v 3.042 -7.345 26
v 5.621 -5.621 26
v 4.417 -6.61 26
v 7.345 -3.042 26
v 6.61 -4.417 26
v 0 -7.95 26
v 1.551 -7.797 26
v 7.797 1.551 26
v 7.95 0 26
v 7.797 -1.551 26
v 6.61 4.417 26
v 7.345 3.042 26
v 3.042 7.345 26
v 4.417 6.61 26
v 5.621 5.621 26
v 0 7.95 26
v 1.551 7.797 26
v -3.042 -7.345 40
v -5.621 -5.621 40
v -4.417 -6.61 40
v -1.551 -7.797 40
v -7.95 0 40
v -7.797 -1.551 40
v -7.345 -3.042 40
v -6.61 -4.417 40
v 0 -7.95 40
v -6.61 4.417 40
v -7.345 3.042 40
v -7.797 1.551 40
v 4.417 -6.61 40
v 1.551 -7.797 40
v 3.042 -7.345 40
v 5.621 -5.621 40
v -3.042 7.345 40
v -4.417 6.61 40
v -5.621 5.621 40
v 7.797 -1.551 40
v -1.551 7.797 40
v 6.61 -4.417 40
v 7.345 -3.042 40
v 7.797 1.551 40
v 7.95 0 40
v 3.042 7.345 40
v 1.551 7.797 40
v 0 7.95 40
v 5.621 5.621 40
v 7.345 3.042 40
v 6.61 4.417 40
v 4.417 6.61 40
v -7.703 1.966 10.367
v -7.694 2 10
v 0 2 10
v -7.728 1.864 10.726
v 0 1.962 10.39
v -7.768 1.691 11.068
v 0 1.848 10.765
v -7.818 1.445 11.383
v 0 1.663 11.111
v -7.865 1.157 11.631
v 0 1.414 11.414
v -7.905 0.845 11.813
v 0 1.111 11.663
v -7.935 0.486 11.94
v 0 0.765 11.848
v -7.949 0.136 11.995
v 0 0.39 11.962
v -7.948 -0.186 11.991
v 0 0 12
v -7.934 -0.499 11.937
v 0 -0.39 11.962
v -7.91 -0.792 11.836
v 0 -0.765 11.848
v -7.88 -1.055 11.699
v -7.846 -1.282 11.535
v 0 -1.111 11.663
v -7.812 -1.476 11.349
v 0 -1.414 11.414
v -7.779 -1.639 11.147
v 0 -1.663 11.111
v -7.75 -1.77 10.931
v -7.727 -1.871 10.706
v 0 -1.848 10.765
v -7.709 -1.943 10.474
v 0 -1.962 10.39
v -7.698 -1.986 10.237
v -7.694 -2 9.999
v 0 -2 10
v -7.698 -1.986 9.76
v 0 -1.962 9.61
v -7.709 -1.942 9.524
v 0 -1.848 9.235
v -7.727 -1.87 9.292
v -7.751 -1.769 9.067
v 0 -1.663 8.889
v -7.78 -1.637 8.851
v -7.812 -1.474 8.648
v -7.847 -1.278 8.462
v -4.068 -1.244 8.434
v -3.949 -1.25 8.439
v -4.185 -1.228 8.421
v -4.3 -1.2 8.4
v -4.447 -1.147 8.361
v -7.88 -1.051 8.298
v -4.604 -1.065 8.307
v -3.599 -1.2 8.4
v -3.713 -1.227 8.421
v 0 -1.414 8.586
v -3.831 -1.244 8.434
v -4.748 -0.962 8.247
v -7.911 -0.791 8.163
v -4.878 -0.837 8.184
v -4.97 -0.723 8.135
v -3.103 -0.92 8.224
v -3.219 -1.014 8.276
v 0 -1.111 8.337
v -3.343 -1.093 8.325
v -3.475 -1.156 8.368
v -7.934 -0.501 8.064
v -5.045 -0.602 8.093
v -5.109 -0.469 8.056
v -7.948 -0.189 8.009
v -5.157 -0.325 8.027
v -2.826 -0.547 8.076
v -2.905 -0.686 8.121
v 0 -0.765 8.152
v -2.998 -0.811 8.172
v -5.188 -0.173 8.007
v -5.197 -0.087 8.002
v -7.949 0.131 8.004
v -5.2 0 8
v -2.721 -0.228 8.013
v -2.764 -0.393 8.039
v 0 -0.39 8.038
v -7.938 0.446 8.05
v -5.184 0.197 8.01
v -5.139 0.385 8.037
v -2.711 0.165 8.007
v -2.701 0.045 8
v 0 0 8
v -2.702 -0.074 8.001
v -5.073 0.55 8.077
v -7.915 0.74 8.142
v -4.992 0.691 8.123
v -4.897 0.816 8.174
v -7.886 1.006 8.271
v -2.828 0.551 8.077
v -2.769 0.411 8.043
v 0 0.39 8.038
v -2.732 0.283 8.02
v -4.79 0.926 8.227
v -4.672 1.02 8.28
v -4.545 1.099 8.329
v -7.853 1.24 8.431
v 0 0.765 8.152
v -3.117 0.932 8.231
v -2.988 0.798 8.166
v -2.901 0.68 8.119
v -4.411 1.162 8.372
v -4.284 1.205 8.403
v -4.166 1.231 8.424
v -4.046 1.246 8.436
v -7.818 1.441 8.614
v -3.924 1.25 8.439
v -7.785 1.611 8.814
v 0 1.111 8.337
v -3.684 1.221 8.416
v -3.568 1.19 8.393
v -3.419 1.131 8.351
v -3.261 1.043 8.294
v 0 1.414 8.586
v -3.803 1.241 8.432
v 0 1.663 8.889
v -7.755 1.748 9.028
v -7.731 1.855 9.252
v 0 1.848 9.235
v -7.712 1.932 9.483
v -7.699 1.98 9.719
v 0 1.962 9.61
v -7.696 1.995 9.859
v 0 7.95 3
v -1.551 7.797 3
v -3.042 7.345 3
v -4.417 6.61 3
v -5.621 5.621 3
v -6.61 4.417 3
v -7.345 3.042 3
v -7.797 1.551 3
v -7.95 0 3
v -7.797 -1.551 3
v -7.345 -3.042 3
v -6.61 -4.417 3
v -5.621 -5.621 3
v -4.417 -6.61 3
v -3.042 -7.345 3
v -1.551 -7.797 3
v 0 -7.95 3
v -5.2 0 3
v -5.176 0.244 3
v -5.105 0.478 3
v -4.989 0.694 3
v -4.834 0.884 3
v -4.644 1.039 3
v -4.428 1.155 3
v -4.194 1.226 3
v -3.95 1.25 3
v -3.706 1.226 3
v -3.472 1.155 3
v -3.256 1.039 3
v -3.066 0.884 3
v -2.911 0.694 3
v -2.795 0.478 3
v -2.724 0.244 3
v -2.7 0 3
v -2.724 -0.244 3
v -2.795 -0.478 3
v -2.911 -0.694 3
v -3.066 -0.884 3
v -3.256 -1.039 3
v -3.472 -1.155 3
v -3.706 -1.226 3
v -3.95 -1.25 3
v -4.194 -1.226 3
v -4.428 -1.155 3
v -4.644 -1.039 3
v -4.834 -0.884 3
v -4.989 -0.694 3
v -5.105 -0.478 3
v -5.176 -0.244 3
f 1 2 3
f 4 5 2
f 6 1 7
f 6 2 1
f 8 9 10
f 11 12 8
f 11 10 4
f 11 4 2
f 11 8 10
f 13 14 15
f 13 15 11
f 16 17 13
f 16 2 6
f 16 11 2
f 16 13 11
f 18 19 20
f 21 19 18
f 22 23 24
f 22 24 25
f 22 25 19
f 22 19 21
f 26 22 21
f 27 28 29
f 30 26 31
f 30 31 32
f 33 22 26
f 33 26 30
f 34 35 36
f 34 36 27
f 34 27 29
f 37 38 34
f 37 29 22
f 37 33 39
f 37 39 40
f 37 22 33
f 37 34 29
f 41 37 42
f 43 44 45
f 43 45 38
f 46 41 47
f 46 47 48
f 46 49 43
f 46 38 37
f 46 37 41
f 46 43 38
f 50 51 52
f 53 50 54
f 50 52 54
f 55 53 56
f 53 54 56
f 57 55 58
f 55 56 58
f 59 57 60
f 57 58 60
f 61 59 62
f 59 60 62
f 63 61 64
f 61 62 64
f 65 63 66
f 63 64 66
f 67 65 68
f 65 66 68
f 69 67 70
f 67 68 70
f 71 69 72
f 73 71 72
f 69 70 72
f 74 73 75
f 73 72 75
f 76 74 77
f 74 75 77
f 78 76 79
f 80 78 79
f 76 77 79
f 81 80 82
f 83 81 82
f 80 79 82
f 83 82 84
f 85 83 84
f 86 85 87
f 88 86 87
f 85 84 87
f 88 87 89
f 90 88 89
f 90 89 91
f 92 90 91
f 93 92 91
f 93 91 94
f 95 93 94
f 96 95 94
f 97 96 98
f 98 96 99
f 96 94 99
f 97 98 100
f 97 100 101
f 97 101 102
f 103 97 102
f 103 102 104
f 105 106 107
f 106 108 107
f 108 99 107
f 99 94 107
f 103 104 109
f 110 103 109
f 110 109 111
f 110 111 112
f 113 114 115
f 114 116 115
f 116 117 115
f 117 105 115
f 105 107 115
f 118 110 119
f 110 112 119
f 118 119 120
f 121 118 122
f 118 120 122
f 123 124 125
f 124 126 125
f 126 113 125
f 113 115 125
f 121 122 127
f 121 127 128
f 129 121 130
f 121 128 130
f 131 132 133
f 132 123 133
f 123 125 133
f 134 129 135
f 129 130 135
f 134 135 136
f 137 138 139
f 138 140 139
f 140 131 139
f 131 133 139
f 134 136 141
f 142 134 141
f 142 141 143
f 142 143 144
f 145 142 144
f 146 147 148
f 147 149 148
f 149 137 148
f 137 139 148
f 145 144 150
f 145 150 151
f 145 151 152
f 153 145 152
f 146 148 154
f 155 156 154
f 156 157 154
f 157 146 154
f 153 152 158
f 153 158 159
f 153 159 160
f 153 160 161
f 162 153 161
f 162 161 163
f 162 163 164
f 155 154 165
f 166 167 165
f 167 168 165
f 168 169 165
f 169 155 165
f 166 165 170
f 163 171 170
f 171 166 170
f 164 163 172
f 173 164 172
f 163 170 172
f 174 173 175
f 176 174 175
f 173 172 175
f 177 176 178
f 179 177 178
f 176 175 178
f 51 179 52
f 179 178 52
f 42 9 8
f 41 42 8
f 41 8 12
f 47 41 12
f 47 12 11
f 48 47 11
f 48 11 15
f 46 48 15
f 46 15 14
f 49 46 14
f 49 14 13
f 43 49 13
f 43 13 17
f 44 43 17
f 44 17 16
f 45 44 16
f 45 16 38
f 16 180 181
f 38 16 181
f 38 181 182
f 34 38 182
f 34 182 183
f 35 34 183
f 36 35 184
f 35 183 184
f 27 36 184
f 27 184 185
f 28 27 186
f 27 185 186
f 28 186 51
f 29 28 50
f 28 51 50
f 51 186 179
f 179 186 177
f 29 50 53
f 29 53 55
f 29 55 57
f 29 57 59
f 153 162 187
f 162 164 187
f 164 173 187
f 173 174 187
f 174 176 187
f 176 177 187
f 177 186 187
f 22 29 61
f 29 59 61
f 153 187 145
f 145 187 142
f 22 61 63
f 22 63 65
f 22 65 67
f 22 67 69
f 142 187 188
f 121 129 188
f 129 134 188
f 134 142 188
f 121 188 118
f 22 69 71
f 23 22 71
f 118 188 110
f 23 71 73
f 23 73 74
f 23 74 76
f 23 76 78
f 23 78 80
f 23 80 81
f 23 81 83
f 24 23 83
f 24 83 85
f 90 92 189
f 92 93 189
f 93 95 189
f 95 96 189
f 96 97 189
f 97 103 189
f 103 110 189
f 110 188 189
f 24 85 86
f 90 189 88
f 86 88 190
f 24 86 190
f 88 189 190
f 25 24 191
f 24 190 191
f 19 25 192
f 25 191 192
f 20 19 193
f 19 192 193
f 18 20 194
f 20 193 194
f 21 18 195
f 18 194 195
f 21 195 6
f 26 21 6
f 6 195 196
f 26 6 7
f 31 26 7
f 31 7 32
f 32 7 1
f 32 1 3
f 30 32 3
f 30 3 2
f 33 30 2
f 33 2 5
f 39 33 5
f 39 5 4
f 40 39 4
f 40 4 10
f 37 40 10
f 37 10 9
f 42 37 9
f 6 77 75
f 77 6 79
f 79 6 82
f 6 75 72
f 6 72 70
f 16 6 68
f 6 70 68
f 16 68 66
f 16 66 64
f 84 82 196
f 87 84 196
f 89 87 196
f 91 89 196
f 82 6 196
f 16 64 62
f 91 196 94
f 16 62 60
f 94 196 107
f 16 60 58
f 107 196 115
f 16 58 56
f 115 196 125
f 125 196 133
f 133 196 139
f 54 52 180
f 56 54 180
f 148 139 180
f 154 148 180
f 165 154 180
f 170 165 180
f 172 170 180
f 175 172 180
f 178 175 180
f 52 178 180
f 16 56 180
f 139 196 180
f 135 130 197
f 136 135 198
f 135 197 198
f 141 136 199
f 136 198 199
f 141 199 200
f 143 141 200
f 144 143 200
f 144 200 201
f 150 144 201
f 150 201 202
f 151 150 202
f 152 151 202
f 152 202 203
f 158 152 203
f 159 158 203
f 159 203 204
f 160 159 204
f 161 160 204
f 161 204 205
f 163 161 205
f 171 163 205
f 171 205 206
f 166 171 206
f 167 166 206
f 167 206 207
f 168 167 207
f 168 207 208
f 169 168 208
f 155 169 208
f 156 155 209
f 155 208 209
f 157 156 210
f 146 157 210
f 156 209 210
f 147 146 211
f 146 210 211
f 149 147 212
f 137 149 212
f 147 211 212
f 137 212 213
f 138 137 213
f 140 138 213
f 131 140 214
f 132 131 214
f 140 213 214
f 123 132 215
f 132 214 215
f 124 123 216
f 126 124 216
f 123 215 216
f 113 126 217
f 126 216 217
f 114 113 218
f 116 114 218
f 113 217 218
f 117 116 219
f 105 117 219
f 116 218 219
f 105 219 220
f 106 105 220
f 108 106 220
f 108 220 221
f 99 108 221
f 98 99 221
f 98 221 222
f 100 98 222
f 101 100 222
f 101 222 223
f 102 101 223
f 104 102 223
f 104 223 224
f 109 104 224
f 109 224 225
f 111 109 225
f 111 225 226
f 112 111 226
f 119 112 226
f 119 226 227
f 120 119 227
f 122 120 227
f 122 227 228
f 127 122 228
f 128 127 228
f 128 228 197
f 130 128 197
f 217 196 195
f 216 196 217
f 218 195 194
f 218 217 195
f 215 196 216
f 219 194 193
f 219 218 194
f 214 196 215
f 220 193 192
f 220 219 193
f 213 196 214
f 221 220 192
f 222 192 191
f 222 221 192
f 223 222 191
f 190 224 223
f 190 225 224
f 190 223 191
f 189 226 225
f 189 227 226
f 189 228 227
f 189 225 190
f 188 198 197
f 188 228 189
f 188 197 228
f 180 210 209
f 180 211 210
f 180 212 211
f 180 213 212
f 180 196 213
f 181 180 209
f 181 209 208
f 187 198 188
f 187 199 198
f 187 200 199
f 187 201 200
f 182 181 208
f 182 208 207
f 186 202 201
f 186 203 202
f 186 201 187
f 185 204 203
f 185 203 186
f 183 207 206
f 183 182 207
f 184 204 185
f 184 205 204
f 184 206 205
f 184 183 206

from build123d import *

# Parameters (mm, degrees)
SKETCH_1_R          = 7.95
EXTRUDE_1_DEPTH     = 30
SKETCH_2_R          = 7.95
EXTRUDE_2_DEPTH     = 10
SKETCH_3_W          = 7.95
SKETCH_3_H          = 15.9
CUT_EXTRUDE_1_DEPTH = 26
SKETCH_4_R          = 2
CUT_EXTRUDE_2_DEPTH = 42.550030084
M3X0_5_1_REACH      = 43.55
M3X0_5_1_BORE_R     = 1.25
CUT_EXTRUDE_3_DEPTH = 39.670466911


with BuildPart() as part:
    # ｽｹｯﾁ1 → ﾎﾞｽ - 押し出し1 (new body)
    with BuildSketch(Plane.XY):
        Circle(SKETCH_1_R)
    extrude(amount=EXTRUDE_1_DEPTH)

    # ｽｹｯﾁ2 → ﾎﾞｽ - 押し出し2 (add)
    with BuildSketch(Plane.XY.offset(30)):
        Circle(SKETCH_2_R)
    extrude(amount=EXTRUDE_2_DEPTH)

    # ｽｹｯﾁ3 → ｶｯﾄ - 押し出し1 (cut)
    with BuildSketch(Plane(origin=(0, 0, 0), x_dir=(-1, 0, 0), z_dir=(0, 0, -1))):
        with Locations((-3.975, 0)):
            Rectangle(SKETCH_3_W, SKETCH_3_H)
    extrude(amount=-CUT_EXTRUDE_1_DEPTH, mode=Mode.SUBTRACT)

    # ｽｹｯﾁ4 → ｶｯﾄ - 押し出し2 (cut, through all)
    with BuildSketch(Plane(origin=(0, 0, 0), x_dir=(0, 0, -1), z_dir=(1, 0, 0))):
        with Locations(Location((-10, 0, 0), (0, 0, 90))):
            Circle(SKETCH_4_R)
    extrude(amount=-CUT_EXTRUDE_2_DEPTH, mode=Mode.SUBTRACT)

    # M3x0.5 ねじ穴1 bore → M3x0.5 ねじ穴1 (cut, up to next)
    with BuildSketch(Plane(origin=(0, 0, 0), x_dir=(-1, 0, 0), z_dir=(0, 0, -1)), mode=Mode.PRIVATE) as m3x0_5_1_sk1:
        with Locations((3.95, 0)):
            Circle(M3X0_5_1_BORE_R)
    m3x0_5_1_tool1 = extrude(m3x0_5_1_sk1.sketch, amount=-M3X0_5_1_REACH, mode=Mode.PRIVATE) & part.part
    add(m3x0_5_1_tool1.solids().sort_by_distance((-3.95, 0, 0))[0], mode=Mode.SUBTRACT)

    # ｽｹｯﾁ7 → ｶｯﾄ - 押し出し3 (cut, through all)
    with BuildSketch(Plane(origin=(0, 0, 3), x_dir=(-1, 0, 0), z_dir=(0, 0, -1))):
        with BuildLine():
            Line((0, 7.95), (0, -7.95))
            ThreePointArc((0, -7.95), (7.95, 0), (0, 7.95))
        make_face()
    extrude(amount=CUT_EXTRUDE_3_DEPTH, mode=Mode.SUBTRACT)


solid = part.part
